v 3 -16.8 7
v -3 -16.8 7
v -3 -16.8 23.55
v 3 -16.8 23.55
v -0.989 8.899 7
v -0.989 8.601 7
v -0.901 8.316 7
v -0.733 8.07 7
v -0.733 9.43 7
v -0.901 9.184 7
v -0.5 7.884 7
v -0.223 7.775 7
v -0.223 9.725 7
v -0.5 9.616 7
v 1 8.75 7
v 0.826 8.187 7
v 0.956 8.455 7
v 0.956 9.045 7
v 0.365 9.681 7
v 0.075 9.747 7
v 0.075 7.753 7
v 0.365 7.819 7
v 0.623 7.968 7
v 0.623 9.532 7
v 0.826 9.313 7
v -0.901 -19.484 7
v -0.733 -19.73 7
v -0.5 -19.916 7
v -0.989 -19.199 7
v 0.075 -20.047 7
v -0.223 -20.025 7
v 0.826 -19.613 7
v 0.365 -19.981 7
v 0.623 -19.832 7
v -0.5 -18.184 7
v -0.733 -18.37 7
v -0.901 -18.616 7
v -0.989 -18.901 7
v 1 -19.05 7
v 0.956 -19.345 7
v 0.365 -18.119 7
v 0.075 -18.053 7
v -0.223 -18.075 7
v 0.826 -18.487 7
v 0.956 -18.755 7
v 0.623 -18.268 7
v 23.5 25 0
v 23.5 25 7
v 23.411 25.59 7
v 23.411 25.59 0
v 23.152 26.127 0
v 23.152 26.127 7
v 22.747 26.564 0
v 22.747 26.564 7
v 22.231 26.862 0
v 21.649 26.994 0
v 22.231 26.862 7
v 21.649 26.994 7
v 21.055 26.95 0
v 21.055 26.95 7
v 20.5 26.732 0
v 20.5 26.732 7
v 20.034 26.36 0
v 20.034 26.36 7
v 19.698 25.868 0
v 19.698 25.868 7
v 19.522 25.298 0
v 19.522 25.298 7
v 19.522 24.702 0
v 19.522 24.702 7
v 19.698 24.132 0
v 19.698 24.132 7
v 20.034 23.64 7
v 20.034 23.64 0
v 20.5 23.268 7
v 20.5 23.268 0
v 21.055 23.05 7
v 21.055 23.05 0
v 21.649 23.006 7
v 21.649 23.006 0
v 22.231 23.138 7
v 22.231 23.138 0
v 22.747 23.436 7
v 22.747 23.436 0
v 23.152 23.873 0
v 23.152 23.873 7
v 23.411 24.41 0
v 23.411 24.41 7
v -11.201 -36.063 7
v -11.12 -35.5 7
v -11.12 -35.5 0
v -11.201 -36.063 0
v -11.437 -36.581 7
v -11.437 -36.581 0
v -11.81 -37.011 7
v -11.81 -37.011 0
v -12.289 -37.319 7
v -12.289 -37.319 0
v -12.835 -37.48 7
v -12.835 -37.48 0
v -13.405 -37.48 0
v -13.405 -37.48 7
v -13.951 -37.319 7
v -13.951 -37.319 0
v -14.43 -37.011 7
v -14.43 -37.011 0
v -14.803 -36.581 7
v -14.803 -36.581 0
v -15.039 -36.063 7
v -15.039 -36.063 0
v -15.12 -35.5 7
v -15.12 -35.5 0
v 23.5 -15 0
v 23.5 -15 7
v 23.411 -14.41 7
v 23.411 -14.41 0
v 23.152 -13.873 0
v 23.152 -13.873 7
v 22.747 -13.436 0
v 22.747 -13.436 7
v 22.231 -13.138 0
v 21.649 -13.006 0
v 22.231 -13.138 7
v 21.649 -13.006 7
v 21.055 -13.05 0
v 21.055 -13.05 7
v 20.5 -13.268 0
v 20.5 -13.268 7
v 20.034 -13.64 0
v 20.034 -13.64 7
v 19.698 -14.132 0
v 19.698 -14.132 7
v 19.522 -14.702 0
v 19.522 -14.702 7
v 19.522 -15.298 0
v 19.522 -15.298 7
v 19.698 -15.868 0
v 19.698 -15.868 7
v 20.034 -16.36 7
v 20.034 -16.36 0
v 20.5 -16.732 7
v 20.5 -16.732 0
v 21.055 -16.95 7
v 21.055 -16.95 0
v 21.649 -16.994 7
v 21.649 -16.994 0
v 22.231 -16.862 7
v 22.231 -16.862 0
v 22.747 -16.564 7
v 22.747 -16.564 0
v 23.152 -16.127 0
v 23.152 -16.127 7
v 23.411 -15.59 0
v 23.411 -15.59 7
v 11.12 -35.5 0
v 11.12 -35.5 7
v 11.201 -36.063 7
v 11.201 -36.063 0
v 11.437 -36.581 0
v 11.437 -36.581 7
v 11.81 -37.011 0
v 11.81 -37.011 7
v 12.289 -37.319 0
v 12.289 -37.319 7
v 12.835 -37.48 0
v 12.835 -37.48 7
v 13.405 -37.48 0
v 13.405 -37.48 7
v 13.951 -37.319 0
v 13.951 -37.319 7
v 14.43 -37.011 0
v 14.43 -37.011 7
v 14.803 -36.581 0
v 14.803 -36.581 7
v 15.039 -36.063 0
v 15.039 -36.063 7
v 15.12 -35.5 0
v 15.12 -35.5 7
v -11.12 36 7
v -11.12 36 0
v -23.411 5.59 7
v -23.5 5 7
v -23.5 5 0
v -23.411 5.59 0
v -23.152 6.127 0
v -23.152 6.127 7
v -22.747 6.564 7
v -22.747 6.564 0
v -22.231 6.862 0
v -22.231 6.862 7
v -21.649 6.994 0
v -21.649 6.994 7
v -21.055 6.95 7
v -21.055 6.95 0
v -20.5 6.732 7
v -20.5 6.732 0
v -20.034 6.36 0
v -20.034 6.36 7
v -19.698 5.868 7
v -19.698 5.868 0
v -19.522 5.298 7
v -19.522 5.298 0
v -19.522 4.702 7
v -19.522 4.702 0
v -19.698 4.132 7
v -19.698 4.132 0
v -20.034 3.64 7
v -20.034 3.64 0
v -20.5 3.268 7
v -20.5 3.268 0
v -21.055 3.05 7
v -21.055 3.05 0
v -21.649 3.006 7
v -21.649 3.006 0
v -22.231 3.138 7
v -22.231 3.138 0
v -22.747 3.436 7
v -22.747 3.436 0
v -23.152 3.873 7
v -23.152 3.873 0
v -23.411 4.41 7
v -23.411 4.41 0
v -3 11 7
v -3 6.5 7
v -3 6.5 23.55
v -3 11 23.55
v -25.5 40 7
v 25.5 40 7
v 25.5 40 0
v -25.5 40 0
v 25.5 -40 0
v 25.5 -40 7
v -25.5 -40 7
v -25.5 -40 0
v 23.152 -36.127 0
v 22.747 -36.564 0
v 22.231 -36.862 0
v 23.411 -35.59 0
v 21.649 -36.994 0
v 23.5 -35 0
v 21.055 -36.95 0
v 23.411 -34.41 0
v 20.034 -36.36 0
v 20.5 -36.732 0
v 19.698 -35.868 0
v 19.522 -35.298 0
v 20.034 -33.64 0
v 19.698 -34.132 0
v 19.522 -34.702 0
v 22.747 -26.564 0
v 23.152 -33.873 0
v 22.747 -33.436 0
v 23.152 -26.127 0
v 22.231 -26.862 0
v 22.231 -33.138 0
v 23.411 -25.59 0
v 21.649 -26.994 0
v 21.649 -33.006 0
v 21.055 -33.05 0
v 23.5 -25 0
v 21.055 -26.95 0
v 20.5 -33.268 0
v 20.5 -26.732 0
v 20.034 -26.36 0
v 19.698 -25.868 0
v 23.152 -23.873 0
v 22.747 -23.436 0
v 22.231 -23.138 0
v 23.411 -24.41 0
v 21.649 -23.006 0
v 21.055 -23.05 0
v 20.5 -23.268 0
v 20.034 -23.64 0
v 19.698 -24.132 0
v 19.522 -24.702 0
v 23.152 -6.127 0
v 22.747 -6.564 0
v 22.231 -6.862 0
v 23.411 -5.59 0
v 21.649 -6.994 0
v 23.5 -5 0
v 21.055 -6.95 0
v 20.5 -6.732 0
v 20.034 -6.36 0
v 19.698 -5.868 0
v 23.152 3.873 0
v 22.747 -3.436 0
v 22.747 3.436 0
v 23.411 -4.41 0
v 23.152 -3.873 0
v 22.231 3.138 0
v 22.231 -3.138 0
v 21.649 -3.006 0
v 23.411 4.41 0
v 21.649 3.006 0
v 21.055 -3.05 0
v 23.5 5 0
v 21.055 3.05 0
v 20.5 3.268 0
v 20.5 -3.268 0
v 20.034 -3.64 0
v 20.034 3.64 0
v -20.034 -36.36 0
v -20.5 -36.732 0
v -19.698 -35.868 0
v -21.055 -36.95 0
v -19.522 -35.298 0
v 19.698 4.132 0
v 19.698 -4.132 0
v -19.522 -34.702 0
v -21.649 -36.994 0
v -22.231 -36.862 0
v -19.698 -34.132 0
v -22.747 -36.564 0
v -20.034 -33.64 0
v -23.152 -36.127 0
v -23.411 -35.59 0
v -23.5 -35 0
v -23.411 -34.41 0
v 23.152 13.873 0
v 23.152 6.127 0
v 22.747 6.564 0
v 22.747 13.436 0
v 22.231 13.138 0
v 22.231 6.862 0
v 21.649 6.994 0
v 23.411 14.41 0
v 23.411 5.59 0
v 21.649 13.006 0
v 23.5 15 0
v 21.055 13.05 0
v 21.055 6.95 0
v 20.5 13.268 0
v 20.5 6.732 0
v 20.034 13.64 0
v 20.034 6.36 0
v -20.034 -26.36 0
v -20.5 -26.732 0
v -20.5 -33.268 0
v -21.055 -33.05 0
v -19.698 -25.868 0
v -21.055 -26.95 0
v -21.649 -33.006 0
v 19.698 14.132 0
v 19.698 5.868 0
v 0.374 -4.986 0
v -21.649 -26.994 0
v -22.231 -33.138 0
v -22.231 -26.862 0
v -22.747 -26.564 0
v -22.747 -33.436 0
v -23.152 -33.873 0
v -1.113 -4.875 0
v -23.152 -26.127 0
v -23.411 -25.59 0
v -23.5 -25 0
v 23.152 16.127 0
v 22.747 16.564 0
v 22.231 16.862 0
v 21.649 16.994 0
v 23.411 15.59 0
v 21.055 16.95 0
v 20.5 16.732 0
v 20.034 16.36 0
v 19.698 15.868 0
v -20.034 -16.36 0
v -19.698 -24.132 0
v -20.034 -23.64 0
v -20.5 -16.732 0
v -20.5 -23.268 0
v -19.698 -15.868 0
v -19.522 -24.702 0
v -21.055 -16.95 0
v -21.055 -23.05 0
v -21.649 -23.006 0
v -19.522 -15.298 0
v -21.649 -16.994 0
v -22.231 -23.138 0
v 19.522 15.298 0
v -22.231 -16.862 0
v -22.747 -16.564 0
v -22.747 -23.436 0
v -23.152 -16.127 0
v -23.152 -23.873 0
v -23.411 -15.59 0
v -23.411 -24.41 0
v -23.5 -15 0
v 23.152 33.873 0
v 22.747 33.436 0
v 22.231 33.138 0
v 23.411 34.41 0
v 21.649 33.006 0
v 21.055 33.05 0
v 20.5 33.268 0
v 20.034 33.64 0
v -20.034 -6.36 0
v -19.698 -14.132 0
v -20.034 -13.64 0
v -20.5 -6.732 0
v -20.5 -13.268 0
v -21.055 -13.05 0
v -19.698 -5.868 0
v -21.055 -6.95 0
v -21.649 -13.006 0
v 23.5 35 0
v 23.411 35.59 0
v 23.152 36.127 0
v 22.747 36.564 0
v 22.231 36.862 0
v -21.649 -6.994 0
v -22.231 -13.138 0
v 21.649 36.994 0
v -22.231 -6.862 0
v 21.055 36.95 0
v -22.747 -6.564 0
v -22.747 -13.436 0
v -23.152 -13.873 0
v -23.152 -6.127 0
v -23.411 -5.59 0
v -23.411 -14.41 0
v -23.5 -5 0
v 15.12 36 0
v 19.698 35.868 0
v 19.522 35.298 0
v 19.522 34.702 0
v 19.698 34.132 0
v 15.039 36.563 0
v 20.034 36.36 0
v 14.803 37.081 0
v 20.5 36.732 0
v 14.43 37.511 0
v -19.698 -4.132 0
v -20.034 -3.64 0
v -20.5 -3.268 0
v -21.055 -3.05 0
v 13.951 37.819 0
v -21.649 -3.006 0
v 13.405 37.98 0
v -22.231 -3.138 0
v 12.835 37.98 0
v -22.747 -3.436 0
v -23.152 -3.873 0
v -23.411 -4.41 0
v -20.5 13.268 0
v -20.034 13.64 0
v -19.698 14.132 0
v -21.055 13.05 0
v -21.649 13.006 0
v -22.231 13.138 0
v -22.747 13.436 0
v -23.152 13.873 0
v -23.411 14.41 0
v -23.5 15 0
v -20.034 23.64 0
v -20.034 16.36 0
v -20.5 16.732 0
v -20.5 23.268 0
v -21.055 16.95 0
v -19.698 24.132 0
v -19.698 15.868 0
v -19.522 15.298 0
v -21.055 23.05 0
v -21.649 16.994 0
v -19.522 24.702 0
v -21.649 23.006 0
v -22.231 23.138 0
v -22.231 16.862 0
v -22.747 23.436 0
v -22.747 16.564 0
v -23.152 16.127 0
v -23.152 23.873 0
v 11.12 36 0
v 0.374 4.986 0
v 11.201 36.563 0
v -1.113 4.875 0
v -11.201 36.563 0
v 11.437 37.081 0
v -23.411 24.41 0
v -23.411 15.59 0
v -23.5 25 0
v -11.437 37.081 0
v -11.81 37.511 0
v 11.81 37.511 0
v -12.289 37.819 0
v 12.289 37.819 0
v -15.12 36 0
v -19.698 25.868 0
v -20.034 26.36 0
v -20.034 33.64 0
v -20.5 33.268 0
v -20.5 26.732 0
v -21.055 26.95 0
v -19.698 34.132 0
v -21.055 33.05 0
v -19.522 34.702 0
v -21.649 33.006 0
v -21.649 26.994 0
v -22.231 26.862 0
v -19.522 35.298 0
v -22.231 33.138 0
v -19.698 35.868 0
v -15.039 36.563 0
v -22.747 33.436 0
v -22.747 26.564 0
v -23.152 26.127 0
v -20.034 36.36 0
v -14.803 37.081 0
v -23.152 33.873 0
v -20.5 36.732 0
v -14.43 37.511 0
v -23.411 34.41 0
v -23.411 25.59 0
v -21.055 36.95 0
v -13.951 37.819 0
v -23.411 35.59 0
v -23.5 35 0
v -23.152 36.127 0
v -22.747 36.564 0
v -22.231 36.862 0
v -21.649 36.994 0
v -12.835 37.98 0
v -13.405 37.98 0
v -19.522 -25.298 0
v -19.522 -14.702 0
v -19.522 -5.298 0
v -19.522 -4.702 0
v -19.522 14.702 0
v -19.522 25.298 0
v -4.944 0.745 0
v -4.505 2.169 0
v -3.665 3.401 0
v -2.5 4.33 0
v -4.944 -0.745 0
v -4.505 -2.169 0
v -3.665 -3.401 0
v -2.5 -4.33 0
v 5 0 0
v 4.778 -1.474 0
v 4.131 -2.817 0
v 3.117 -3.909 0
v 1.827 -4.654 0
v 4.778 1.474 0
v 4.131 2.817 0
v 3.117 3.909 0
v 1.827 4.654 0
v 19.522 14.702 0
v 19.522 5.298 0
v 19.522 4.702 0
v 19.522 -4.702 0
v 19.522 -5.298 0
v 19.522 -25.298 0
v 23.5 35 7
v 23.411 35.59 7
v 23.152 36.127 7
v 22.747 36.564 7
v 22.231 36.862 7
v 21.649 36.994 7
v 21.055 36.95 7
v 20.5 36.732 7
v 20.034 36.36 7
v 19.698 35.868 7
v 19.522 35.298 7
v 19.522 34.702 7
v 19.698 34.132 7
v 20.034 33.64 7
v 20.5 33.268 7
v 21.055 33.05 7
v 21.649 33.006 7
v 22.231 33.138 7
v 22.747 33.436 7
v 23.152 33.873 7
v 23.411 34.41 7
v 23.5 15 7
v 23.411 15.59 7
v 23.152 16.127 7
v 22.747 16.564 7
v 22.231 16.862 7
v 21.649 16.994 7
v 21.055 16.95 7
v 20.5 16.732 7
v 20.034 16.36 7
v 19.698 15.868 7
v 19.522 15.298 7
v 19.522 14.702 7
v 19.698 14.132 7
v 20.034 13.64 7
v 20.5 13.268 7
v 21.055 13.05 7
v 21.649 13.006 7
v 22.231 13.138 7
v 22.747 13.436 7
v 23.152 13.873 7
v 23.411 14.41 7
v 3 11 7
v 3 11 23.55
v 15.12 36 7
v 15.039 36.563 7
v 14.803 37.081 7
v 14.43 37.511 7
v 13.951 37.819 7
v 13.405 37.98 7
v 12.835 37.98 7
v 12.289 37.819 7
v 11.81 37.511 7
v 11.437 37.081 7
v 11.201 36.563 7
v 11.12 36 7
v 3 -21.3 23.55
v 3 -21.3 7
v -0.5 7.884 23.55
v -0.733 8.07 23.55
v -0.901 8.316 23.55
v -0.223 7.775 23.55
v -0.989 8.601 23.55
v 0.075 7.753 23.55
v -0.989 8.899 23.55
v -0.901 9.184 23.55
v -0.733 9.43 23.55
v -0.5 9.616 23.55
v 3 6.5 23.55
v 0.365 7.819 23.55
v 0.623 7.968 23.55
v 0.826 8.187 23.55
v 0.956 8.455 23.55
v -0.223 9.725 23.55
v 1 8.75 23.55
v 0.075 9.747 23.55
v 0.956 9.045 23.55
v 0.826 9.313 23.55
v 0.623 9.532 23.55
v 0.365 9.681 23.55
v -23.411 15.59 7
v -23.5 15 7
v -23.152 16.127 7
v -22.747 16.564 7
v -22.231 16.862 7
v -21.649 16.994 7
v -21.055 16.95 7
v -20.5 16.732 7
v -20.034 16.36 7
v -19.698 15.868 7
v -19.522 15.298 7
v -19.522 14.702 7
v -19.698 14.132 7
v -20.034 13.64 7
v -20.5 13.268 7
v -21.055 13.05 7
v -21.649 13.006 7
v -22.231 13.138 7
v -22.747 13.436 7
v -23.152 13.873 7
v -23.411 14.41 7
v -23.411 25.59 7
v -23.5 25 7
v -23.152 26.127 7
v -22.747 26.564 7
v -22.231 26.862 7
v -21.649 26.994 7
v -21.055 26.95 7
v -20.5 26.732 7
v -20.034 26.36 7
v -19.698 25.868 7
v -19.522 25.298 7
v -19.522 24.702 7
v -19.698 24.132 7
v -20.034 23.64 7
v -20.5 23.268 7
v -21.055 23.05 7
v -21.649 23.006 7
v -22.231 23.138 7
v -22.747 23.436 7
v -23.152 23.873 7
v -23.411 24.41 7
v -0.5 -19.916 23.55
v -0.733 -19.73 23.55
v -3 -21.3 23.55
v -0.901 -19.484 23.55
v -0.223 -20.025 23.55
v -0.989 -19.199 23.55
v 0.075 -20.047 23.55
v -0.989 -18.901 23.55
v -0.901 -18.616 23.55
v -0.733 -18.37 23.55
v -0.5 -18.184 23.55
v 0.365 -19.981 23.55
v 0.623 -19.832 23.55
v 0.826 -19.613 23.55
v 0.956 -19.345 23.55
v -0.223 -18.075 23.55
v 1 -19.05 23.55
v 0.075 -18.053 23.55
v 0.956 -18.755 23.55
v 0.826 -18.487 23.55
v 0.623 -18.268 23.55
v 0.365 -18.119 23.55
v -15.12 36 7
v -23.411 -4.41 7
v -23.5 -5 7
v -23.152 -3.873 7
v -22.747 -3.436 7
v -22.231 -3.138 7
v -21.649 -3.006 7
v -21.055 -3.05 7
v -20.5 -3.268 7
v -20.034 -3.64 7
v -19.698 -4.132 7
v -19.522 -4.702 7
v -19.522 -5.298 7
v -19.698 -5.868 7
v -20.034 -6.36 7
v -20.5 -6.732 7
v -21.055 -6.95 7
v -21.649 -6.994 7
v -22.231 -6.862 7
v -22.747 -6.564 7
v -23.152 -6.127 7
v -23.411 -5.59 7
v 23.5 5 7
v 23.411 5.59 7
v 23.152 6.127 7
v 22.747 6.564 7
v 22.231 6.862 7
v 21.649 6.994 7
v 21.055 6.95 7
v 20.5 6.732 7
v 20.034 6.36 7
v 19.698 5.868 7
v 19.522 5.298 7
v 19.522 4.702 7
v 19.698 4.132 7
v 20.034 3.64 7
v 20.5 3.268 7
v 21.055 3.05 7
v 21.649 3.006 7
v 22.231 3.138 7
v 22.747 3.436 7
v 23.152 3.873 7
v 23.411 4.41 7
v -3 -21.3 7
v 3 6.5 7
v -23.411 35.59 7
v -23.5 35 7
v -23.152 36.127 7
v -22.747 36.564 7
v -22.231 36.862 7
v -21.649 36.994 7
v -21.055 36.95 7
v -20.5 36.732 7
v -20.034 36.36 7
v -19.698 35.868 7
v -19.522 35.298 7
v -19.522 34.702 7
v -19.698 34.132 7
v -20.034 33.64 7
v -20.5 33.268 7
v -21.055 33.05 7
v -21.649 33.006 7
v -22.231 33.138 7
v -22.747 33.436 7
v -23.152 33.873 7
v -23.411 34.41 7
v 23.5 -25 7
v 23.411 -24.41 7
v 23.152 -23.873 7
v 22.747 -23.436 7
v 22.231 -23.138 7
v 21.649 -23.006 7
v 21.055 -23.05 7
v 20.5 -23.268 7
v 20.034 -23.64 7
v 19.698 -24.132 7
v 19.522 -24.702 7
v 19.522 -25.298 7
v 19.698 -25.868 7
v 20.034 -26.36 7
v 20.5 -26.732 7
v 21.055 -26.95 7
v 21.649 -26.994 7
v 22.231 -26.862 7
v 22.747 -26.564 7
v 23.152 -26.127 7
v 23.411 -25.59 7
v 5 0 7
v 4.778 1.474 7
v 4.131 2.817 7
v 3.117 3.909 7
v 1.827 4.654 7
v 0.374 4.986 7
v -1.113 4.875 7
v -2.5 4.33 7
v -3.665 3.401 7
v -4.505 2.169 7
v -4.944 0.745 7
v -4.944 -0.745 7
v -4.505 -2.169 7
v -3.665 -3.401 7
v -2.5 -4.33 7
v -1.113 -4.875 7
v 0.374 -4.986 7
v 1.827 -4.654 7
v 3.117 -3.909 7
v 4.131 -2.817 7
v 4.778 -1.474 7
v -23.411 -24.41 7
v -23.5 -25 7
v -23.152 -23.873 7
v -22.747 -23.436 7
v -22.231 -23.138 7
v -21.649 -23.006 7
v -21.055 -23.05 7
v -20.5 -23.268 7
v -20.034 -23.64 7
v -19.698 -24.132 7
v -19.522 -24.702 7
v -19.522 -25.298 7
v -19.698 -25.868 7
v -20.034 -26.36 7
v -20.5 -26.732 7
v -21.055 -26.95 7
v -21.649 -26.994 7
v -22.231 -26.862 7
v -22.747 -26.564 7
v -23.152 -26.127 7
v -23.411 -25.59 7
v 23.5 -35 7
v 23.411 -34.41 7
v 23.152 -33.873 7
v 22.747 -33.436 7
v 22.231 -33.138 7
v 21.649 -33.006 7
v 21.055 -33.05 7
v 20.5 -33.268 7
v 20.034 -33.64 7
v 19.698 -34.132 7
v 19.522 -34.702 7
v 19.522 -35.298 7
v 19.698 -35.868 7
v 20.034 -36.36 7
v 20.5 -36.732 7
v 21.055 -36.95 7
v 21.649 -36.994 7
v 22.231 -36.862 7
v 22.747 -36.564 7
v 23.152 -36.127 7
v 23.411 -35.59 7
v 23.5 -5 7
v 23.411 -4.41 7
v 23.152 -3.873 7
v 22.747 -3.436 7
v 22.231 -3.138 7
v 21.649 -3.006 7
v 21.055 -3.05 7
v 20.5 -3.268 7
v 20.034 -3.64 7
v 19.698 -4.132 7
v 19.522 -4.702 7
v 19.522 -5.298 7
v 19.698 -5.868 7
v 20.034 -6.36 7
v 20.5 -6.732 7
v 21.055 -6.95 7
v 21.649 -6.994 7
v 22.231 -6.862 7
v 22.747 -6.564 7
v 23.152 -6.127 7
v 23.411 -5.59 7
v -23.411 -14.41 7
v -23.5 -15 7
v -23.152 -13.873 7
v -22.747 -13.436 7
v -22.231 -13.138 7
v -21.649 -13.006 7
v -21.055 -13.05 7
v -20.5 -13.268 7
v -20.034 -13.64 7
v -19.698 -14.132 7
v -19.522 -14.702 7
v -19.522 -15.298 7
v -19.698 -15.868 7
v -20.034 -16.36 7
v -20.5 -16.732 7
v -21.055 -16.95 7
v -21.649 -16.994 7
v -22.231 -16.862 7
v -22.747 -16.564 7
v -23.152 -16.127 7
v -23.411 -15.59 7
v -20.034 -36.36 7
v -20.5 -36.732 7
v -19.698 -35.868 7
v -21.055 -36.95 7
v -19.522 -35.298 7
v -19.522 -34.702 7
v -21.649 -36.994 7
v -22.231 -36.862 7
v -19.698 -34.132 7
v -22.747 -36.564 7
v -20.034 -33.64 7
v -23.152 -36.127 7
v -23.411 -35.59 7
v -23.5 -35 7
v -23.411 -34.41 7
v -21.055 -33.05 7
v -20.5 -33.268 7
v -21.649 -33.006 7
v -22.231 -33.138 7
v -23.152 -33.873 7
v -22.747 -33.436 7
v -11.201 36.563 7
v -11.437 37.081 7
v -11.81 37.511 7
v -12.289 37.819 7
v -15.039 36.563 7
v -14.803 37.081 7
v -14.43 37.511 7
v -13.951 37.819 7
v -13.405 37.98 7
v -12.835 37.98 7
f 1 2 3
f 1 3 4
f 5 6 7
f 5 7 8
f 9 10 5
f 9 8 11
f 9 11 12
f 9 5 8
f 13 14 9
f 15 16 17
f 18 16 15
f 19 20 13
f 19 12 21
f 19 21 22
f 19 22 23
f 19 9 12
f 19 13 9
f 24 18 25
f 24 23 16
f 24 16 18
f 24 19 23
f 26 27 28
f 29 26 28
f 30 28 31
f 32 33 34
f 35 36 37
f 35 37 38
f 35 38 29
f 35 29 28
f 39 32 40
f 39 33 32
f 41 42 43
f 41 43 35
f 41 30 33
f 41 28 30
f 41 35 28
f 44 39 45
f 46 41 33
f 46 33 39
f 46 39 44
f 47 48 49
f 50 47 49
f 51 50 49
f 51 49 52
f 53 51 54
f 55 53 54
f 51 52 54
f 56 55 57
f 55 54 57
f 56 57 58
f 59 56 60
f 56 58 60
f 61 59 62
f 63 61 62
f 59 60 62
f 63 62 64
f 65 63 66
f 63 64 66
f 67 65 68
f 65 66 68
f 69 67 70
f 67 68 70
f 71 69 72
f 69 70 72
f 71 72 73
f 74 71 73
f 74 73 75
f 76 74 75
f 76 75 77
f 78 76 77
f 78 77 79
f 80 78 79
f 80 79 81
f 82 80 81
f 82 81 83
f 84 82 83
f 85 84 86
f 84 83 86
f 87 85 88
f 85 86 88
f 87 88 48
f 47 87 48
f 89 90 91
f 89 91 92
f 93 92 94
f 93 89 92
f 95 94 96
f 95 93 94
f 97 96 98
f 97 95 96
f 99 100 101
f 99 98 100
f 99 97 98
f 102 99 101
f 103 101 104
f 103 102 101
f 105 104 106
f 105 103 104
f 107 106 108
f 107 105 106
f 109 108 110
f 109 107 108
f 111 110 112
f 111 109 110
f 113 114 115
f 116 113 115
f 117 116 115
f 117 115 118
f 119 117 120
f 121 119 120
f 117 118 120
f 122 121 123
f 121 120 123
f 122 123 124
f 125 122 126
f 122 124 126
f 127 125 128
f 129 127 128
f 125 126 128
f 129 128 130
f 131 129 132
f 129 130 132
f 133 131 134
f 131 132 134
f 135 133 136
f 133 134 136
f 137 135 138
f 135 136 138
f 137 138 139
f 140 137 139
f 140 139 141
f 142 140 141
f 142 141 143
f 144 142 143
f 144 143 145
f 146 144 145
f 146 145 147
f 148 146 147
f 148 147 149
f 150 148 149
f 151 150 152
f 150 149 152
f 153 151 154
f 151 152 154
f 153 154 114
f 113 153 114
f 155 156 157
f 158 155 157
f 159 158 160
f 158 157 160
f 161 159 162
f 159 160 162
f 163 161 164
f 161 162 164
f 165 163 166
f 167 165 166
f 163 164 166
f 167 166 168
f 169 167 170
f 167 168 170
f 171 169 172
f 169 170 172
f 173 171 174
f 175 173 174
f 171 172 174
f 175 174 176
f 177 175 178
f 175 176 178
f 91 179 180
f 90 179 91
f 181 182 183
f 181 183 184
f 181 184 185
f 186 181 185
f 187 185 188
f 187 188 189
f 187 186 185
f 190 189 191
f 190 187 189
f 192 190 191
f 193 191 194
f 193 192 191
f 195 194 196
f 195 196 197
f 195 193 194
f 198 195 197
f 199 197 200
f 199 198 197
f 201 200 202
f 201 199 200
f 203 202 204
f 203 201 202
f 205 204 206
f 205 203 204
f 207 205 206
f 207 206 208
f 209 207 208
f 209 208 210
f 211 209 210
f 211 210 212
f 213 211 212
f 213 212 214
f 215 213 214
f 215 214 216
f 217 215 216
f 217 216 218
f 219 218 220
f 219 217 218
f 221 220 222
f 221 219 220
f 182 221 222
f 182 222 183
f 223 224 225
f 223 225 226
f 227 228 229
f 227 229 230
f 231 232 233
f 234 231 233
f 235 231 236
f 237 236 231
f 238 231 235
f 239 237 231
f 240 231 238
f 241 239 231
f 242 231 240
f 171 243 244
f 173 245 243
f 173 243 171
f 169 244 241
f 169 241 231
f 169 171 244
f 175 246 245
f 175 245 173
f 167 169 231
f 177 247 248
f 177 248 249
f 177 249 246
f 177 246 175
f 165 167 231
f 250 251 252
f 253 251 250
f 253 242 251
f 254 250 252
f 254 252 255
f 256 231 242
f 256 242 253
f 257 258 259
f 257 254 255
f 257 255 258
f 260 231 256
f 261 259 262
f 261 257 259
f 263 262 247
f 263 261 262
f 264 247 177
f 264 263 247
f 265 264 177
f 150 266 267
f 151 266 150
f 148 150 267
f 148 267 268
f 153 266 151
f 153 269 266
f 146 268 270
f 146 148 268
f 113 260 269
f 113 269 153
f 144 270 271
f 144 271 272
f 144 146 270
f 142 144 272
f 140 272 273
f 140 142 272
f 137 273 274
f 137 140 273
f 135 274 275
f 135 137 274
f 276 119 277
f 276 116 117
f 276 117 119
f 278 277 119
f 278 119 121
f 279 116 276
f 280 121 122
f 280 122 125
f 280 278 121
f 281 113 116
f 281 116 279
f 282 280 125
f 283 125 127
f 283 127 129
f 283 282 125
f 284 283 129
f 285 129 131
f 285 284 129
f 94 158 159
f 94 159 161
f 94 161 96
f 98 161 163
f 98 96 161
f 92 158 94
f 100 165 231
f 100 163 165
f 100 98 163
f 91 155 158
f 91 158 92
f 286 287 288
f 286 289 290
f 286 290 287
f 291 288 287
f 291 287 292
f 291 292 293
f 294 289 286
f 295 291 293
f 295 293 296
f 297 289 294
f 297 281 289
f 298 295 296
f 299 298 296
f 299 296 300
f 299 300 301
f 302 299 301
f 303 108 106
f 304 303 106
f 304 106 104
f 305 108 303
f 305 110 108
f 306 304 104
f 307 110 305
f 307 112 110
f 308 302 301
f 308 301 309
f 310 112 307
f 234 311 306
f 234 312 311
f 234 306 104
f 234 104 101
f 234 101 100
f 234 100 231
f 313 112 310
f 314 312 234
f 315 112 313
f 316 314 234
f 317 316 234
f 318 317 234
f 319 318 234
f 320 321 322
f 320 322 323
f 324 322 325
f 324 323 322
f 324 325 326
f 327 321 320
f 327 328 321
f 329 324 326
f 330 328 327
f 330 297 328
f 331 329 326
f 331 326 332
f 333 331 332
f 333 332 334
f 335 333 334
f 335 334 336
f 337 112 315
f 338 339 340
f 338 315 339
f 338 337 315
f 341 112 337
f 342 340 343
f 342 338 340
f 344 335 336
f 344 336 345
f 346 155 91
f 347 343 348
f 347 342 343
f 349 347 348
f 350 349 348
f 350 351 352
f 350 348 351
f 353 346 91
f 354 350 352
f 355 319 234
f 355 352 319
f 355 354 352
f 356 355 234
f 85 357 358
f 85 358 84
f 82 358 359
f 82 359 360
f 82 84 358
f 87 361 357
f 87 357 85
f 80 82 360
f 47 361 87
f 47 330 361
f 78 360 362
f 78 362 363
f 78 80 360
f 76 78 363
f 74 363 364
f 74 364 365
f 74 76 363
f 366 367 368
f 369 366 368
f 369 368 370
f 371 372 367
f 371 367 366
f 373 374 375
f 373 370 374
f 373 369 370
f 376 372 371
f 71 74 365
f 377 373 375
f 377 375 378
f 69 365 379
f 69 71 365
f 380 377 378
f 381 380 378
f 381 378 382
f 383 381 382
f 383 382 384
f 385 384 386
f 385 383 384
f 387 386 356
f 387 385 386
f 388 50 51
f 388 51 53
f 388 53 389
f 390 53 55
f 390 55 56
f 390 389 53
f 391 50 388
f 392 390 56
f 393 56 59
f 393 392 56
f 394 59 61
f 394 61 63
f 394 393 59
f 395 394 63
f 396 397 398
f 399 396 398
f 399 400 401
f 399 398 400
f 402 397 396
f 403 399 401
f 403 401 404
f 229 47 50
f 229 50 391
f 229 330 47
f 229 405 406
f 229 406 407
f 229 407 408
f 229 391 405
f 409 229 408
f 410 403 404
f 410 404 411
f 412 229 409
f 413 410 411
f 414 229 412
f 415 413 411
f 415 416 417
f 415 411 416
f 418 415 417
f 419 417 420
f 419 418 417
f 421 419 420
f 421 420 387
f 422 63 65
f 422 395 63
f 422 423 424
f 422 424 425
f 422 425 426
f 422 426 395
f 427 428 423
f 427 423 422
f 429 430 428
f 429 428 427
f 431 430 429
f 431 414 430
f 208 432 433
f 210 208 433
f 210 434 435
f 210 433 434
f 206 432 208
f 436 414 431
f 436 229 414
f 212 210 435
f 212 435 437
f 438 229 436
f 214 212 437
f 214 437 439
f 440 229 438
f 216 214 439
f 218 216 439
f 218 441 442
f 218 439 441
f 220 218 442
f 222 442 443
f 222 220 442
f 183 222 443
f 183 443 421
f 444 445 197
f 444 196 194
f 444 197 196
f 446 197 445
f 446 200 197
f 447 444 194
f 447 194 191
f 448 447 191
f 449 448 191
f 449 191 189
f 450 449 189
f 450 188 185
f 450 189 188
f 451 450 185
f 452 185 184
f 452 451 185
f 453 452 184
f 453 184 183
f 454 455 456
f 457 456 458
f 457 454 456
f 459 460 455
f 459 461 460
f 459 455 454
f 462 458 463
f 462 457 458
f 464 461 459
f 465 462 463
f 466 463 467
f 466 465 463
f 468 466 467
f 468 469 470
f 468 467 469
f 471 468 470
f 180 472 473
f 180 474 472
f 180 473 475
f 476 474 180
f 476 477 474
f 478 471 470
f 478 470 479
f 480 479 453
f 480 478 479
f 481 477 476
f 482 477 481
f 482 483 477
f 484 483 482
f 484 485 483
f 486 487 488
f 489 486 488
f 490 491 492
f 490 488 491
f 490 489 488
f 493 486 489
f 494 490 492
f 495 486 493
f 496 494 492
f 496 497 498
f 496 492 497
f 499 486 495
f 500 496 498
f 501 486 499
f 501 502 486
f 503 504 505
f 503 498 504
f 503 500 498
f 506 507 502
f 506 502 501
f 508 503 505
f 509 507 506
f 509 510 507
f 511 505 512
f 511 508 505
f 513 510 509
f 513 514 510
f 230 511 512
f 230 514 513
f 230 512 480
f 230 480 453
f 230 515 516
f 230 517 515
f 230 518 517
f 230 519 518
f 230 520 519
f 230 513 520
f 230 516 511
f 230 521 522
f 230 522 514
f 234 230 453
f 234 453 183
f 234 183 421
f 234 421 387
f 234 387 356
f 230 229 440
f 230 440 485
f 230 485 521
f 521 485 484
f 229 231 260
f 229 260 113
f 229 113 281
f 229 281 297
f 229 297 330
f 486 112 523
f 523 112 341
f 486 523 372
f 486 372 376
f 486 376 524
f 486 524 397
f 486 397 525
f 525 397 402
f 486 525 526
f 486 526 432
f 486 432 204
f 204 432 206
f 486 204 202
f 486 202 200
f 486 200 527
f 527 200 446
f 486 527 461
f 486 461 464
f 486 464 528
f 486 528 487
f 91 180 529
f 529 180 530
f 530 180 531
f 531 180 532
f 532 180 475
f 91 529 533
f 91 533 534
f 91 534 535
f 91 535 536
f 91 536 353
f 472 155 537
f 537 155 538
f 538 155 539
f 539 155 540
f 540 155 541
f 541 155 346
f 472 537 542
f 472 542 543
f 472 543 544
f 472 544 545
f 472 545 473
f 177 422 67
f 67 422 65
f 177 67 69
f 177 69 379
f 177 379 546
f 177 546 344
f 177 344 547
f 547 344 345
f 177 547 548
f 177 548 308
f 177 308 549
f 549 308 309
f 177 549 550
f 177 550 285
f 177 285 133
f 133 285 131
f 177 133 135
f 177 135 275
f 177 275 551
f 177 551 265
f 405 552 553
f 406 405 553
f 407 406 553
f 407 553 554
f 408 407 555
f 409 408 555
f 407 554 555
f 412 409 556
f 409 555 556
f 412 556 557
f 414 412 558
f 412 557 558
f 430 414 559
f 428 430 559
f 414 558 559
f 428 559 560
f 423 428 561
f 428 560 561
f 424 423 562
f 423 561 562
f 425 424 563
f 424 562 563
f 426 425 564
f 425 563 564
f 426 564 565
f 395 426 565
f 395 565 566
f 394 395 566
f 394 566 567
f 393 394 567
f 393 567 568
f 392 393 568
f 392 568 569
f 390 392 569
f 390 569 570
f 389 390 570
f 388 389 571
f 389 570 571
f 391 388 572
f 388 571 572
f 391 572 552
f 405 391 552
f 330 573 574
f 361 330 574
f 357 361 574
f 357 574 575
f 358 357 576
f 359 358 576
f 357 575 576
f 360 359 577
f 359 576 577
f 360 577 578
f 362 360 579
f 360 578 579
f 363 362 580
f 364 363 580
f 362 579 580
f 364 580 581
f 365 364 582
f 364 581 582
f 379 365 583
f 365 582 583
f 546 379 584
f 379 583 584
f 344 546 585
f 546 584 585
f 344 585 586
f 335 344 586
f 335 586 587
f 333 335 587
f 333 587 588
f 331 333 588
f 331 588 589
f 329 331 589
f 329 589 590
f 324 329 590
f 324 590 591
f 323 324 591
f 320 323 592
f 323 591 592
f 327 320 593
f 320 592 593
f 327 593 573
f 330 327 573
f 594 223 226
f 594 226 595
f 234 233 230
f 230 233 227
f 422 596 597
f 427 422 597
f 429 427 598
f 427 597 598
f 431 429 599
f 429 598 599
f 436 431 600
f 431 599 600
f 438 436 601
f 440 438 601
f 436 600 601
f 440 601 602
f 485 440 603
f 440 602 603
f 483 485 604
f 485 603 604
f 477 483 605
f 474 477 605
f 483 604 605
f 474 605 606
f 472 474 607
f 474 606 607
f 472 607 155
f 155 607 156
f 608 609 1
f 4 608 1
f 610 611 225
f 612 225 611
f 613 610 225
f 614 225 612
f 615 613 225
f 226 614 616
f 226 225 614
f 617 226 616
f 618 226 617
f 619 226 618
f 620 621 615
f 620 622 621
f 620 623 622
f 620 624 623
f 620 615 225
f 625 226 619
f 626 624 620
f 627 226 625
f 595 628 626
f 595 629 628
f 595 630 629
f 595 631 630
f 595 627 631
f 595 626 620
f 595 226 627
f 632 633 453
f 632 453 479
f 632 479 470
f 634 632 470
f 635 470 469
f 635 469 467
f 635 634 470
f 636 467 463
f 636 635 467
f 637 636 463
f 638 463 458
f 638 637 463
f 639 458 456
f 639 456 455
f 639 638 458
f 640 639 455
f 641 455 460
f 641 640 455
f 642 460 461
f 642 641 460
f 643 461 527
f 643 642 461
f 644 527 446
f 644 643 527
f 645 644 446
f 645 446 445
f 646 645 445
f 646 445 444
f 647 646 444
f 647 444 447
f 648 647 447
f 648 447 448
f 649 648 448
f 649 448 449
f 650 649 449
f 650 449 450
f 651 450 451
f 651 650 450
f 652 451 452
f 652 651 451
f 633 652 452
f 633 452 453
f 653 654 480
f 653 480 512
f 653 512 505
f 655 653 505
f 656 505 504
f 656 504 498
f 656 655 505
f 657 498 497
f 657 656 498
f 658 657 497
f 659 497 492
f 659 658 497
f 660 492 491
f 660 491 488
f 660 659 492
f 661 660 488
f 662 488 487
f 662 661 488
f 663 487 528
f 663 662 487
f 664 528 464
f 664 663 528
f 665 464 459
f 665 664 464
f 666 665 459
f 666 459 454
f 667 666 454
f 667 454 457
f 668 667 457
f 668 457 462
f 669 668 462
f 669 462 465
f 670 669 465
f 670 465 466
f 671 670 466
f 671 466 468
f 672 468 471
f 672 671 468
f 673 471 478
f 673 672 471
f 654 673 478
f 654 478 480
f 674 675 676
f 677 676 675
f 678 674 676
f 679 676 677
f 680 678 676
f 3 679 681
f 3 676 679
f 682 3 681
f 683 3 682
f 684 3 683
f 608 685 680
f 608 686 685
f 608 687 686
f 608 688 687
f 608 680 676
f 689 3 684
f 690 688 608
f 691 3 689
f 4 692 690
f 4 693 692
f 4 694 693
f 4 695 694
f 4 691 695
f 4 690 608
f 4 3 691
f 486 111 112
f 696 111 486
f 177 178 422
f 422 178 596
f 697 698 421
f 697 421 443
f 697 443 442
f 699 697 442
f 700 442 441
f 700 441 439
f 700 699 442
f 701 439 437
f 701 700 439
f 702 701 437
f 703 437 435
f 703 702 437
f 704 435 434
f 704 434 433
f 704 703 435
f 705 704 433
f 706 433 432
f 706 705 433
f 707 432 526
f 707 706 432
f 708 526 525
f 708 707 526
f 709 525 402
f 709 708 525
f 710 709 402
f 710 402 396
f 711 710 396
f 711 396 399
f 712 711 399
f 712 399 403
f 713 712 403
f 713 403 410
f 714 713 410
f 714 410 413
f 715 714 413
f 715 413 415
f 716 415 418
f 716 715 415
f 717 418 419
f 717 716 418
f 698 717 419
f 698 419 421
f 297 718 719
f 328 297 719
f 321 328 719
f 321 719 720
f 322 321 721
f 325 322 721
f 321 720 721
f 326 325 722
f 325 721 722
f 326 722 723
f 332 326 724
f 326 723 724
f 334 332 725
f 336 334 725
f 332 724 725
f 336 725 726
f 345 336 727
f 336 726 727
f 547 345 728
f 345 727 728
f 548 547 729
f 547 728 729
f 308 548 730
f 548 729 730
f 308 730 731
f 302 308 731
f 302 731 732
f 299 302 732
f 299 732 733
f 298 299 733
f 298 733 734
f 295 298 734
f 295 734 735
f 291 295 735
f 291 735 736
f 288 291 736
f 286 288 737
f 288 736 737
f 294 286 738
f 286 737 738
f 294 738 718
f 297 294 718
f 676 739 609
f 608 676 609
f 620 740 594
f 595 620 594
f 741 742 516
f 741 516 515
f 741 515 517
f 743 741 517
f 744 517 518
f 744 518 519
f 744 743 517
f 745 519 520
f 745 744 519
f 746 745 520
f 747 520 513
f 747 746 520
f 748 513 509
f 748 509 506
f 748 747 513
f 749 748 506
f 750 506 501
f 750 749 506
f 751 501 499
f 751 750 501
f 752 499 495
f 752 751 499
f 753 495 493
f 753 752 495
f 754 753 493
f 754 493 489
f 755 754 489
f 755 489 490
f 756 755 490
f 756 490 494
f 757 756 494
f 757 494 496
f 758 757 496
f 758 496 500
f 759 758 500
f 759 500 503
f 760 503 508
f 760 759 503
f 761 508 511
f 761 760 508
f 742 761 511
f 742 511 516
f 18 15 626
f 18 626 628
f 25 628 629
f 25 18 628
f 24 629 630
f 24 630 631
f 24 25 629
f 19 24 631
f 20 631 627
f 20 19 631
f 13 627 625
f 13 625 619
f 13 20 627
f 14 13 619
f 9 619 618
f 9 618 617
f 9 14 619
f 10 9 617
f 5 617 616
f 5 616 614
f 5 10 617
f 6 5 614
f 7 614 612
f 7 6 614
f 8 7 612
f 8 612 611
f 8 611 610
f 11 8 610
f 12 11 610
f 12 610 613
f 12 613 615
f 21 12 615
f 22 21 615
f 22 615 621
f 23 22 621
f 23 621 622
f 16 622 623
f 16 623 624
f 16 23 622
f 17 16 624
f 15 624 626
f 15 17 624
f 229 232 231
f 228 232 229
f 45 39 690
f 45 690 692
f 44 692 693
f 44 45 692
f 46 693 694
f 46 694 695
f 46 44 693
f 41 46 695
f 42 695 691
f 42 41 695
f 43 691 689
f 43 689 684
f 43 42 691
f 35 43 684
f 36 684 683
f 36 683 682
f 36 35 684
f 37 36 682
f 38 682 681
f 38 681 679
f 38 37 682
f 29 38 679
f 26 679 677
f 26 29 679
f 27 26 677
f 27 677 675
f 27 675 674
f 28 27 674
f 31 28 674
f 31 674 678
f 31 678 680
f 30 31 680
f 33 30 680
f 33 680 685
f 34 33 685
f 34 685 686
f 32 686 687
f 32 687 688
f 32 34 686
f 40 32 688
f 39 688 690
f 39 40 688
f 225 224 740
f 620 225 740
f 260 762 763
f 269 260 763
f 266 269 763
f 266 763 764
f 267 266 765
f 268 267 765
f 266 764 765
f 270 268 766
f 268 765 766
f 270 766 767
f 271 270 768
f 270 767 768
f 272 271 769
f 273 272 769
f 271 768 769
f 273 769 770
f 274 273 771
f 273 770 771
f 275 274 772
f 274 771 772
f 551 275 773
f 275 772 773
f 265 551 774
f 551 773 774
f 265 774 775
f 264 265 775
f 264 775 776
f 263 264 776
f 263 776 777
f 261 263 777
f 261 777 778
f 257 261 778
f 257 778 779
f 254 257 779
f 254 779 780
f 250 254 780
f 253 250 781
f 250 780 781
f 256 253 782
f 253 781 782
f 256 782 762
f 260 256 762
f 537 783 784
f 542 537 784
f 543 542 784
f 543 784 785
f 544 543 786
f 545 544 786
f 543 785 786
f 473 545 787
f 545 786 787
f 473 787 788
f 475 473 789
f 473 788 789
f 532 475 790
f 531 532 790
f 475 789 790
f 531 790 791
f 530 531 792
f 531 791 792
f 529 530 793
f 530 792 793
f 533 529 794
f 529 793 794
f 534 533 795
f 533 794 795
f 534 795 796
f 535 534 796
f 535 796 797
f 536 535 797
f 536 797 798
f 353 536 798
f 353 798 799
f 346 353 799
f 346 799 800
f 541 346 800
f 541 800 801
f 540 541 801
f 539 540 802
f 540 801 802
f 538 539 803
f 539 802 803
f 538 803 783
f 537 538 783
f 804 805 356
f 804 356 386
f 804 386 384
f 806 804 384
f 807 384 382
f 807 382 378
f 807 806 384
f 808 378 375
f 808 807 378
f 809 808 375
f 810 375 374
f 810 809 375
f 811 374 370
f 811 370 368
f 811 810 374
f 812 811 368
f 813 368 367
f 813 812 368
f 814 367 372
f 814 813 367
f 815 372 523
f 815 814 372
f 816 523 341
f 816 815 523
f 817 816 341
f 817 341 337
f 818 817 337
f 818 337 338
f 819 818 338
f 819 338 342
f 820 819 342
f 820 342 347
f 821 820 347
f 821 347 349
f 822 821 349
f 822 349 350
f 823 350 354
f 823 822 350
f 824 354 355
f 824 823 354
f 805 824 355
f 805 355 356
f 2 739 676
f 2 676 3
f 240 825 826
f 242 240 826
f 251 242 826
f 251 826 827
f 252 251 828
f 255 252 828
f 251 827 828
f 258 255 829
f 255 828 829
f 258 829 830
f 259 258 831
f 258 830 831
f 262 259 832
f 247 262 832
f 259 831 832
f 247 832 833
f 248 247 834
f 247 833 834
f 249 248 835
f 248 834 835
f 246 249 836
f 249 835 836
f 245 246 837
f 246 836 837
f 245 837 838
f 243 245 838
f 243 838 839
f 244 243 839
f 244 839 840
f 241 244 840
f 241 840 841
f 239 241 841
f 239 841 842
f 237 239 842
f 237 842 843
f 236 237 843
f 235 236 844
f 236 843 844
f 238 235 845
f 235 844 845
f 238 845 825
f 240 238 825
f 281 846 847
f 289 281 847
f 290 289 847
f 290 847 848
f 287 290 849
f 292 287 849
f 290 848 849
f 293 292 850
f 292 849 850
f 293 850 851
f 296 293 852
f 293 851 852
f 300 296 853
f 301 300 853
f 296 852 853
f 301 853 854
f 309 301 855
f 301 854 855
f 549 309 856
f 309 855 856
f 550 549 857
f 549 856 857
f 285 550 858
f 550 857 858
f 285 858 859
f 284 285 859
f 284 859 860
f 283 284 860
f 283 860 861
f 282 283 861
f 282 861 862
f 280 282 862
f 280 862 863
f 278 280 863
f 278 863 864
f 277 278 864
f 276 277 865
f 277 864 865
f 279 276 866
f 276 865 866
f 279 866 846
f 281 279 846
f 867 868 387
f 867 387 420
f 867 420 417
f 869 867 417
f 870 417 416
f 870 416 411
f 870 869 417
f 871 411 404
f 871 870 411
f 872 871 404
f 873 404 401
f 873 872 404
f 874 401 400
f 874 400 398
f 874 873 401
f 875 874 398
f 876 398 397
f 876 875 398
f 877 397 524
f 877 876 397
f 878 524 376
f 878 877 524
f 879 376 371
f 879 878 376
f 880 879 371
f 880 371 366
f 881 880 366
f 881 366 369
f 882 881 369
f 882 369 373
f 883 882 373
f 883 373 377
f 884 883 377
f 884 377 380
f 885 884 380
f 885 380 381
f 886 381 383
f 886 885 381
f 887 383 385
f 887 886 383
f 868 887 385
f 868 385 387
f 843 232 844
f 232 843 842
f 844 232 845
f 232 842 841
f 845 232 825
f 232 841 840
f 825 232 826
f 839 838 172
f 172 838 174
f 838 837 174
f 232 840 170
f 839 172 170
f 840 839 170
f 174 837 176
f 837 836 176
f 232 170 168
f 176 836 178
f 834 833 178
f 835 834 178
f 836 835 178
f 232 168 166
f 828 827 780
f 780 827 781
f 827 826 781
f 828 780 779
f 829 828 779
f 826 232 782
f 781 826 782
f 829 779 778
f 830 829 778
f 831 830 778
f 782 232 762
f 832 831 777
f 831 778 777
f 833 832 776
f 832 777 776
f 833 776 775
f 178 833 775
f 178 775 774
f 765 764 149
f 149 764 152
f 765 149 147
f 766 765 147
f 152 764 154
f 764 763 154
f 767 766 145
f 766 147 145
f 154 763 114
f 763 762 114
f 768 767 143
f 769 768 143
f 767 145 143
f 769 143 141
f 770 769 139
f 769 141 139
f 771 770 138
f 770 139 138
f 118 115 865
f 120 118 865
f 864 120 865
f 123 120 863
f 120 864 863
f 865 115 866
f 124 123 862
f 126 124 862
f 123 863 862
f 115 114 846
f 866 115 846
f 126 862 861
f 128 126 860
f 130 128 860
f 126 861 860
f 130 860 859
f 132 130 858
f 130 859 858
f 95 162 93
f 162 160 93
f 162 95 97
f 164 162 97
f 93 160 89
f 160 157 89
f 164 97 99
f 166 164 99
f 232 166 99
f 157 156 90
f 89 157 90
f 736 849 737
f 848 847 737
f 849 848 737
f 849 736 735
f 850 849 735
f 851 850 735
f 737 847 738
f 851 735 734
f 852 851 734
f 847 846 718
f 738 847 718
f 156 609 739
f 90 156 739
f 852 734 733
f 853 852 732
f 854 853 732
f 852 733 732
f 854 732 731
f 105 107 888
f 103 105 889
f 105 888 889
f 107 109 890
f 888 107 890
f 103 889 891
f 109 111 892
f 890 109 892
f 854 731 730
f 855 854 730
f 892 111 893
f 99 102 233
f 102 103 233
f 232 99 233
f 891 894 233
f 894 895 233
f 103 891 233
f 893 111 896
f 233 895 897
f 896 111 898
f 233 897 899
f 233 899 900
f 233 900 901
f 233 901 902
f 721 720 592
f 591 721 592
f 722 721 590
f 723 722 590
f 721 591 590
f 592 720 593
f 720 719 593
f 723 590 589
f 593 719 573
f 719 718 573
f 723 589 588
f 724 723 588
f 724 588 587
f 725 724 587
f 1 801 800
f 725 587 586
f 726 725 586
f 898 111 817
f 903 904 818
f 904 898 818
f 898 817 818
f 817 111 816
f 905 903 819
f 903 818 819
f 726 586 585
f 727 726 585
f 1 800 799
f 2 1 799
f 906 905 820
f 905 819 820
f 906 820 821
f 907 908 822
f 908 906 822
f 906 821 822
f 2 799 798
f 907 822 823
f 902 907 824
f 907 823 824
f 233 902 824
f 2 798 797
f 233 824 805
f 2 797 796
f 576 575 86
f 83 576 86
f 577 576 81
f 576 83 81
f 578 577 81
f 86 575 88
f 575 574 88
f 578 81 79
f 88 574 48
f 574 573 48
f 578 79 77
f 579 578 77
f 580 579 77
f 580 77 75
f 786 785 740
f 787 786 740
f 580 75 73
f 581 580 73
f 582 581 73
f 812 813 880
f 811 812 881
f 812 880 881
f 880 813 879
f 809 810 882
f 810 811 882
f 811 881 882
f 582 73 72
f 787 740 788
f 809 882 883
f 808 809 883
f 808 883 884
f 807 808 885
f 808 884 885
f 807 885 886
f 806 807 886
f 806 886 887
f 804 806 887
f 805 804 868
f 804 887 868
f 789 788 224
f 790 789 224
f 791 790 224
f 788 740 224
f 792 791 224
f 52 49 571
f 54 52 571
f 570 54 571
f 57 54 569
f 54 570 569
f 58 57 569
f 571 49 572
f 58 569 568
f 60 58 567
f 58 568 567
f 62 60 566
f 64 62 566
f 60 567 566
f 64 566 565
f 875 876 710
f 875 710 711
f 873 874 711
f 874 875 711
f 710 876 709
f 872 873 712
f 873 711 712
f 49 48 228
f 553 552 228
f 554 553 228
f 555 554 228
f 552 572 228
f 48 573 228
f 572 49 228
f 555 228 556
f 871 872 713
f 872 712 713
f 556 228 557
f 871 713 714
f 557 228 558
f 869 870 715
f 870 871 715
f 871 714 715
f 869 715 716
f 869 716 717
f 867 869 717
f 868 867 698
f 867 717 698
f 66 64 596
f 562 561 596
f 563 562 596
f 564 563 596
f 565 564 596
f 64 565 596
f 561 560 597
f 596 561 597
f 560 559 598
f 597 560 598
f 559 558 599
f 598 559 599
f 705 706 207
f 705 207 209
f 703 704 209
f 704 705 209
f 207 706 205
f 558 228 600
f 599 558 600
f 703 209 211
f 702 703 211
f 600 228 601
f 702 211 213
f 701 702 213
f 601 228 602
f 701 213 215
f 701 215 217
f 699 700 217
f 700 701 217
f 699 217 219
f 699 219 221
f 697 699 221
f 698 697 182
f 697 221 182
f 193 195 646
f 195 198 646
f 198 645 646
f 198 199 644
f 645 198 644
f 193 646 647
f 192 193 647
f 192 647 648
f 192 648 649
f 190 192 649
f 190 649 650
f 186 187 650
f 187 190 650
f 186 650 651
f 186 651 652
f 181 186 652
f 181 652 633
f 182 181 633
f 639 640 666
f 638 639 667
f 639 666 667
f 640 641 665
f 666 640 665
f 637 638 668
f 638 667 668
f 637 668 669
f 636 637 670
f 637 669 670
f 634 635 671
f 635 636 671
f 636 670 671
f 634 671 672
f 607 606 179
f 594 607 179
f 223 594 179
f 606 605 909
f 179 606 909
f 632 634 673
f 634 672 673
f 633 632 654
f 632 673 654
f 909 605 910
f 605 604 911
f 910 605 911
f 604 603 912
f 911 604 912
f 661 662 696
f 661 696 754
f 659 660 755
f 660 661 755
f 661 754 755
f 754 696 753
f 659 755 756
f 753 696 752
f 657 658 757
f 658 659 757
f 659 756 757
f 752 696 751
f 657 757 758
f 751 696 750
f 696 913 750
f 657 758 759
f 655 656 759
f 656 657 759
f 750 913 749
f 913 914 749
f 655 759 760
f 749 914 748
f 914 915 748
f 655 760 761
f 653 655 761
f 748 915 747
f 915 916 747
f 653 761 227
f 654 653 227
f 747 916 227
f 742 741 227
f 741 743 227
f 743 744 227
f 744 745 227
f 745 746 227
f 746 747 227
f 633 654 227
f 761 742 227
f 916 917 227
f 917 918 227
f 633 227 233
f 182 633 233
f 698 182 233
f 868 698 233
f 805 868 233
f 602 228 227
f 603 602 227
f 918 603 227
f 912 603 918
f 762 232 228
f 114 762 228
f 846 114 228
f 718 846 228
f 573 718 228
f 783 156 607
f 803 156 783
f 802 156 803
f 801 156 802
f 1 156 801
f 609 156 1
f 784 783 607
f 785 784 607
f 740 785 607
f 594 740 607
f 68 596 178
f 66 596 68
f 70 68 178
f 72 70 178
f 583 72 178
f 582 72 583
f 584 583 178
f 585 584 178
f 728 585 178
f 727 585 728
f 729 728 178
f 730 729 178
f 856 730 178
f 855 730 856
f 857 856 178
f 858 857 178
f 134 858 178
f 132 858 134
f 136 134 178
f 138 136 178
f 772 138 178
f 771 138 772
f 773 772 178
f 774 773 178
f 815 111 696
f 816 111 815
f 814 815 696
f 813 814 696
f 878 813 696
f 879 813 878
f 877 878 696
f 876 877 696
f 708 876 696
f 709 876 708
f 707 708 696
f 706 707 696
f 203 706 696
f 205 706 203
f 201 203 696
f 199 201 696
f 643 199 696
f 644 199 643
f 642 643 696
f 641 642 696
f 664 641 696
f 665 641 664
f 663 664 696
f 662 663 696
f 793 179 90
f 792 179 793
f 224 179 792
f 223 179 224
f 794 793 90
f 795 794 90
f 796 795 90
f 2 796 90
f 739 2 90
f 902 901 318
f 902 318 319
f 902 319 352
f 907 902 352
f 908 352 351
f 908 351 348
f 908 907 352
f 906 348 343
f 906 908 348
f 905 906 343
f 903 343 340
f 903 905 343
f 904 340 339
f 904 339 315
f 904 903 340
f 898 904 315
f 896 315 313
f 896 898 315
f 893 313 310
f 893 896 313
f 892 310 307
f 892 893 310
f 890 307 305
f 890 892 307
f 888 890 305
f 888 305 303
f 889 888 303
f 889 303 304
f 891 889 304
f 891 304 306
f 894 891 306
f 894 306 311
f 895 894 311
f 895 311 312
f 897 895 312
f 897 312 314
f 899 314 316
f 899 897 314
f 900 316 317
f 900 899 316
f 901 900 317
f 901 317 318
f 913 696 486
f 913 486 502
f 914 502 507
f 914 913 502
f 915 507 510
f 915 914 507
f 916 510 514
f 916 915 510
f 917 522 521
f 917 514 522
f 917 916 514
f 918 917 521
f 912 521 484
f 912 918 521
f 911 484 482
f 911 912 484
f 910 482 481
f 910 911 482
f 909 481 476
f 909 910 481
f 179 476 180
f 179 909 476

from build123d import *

# Parameters (mm, degrees)
SKETCH1_W           = 35
SKETCH1_H           = 80
BOSS_EXTRUDE1_DEPTH = 7
SKETCH2_W           = 6
SKETCH2_H           = 4.5
SKETCH2_R           = 1
BOSS_EXTRUDE2_DEPTH = 16.55
SKETCH3_R           = 5
CUT_EXTRUDE1_DEPTH  = 7
CUT_EXTRUDE2_DEPTH  = 15
SKETCH5_W           = 8
SKETCH5_H           = 80
SKETCH5_R           = 2
BOSS_EXTRUDE3_DEPTH = 7


with BuildPart() as part:
    # Sketch1 → Boss-Extrude1 (new body)
    with BuildSketch(Plane.XY):
        Rectangle(SKETCH1_W, SKETCH1_H)
    extrude(amount=BOSS_EXTRUDE1_DEPTH)

    # Sketch2 → Boss-Extrude2 (add)
    with BuildSketch(Plane.XY.offset(7)):
        with Locations((0, 8.75)):
            Rectangle(SKETCH2_W, SKETCH2_H)
        with Locations((0, 8.75)):
            Circle(SKETCH2_R, mode=Mode.SUBTRACT)
        with Locations((0, -19.05)):
            Rectangle(SKETCH2_W, SKETCH2_H)
        with Locations((0, -19.05)):
            Circle(SKETCH2_R, mode=Mode.SUBTRACT)
    extrude(amount=BOSS_EXTRUDE2_DEPTH)

    # Sketch3 → Cut-Extrude1 (cut)
    with BuildSketch(Plane.XY.offset(7)):
        Circle(SKETCH3_R)
    extrude(amount=-CUT_EXTRUDE1_DEPTH, mode=Mode.SUBTRACT)

    # Sketch4 → Cut-Extrude2 (cut)
    with BuildSketch(Plane.XY.offset(7)):
        with BuildLine():
            Line((-11.12, 36), (-11.12, -35.5))
            ThreePointArc((-11.12, -35.5), (-13.12, -37.5), (-15.12, -35.5))
            Line((-15.12, -35.5), (-15.12, 36))
            ThreePointArc((-15.12, 36), (-13.12, 38), (-11.12, 36))
        make_face()
        with BuildLine():
            Line((11.12, 36), (11.12, -35.5))
            ThreePointArc((11.12, -35.5), (13.12, -37.5), (15.12, -35.5))
            Line((15.12, -35.5), (15.12, 36))
            ThreePointArc((15.12, 36), (13.12, 38), (11.12, 36))
        make_face()
    extrude(amount=-CUT_EXTRUDE2_DEPTH, mode=Mode.SUBTRACT)

    # Sketch5 → Boss-Extrude3 (add)
    with BuildSketch(Plane.XY.offset(7)):
        with Locations((21.5, 0)):
            Rectangle(SKETCH5_W, SKETCH5_H)
        with Locations((21.5, 35)):
            Circle(SKETCH5_R, mode=Mode.SUBTRACT)
        with Locations((21.5, 25)):
            Circle(SKETCH5_R, mode=Mode.SUBTRACT)
        with Locations((21.5, 15)):
            Circle(SKETCH5_R, mode=Mode.SUBTRACT)
        with Locations((21.5, 5)):
            Circle(SKETCH5_R, mode=Mode.SUBTRACT)
        with Locations((21.5, -5)):
            Circle(SKETCH5_R, mode=Mode.SUBTRACT)
        with Locations((21.5, -15)):
            Circle(SKETCH5_R, mode=Mode.SUBTRACT)
        with Locations((21.5, -25)):
            Circle(SKETCH5_R, mode=Mode.SUBTRACT)
        with Locations((21.5, -35)):
            Circle(SKETCH5_R, mode=Mode.SUBTRACT)
    boss_extrude3 = extrude(amount=-BOSS_EXTRUDE3_DEPTH)

    # Mirror1: Boss-Extrude3 across plane
    add(boss_extrude3.mirror(Plane(origin=(0, 0, 0), x_dir=(0, 0, 1), z_dir=(1, 0, 0))))


solid = part.part
